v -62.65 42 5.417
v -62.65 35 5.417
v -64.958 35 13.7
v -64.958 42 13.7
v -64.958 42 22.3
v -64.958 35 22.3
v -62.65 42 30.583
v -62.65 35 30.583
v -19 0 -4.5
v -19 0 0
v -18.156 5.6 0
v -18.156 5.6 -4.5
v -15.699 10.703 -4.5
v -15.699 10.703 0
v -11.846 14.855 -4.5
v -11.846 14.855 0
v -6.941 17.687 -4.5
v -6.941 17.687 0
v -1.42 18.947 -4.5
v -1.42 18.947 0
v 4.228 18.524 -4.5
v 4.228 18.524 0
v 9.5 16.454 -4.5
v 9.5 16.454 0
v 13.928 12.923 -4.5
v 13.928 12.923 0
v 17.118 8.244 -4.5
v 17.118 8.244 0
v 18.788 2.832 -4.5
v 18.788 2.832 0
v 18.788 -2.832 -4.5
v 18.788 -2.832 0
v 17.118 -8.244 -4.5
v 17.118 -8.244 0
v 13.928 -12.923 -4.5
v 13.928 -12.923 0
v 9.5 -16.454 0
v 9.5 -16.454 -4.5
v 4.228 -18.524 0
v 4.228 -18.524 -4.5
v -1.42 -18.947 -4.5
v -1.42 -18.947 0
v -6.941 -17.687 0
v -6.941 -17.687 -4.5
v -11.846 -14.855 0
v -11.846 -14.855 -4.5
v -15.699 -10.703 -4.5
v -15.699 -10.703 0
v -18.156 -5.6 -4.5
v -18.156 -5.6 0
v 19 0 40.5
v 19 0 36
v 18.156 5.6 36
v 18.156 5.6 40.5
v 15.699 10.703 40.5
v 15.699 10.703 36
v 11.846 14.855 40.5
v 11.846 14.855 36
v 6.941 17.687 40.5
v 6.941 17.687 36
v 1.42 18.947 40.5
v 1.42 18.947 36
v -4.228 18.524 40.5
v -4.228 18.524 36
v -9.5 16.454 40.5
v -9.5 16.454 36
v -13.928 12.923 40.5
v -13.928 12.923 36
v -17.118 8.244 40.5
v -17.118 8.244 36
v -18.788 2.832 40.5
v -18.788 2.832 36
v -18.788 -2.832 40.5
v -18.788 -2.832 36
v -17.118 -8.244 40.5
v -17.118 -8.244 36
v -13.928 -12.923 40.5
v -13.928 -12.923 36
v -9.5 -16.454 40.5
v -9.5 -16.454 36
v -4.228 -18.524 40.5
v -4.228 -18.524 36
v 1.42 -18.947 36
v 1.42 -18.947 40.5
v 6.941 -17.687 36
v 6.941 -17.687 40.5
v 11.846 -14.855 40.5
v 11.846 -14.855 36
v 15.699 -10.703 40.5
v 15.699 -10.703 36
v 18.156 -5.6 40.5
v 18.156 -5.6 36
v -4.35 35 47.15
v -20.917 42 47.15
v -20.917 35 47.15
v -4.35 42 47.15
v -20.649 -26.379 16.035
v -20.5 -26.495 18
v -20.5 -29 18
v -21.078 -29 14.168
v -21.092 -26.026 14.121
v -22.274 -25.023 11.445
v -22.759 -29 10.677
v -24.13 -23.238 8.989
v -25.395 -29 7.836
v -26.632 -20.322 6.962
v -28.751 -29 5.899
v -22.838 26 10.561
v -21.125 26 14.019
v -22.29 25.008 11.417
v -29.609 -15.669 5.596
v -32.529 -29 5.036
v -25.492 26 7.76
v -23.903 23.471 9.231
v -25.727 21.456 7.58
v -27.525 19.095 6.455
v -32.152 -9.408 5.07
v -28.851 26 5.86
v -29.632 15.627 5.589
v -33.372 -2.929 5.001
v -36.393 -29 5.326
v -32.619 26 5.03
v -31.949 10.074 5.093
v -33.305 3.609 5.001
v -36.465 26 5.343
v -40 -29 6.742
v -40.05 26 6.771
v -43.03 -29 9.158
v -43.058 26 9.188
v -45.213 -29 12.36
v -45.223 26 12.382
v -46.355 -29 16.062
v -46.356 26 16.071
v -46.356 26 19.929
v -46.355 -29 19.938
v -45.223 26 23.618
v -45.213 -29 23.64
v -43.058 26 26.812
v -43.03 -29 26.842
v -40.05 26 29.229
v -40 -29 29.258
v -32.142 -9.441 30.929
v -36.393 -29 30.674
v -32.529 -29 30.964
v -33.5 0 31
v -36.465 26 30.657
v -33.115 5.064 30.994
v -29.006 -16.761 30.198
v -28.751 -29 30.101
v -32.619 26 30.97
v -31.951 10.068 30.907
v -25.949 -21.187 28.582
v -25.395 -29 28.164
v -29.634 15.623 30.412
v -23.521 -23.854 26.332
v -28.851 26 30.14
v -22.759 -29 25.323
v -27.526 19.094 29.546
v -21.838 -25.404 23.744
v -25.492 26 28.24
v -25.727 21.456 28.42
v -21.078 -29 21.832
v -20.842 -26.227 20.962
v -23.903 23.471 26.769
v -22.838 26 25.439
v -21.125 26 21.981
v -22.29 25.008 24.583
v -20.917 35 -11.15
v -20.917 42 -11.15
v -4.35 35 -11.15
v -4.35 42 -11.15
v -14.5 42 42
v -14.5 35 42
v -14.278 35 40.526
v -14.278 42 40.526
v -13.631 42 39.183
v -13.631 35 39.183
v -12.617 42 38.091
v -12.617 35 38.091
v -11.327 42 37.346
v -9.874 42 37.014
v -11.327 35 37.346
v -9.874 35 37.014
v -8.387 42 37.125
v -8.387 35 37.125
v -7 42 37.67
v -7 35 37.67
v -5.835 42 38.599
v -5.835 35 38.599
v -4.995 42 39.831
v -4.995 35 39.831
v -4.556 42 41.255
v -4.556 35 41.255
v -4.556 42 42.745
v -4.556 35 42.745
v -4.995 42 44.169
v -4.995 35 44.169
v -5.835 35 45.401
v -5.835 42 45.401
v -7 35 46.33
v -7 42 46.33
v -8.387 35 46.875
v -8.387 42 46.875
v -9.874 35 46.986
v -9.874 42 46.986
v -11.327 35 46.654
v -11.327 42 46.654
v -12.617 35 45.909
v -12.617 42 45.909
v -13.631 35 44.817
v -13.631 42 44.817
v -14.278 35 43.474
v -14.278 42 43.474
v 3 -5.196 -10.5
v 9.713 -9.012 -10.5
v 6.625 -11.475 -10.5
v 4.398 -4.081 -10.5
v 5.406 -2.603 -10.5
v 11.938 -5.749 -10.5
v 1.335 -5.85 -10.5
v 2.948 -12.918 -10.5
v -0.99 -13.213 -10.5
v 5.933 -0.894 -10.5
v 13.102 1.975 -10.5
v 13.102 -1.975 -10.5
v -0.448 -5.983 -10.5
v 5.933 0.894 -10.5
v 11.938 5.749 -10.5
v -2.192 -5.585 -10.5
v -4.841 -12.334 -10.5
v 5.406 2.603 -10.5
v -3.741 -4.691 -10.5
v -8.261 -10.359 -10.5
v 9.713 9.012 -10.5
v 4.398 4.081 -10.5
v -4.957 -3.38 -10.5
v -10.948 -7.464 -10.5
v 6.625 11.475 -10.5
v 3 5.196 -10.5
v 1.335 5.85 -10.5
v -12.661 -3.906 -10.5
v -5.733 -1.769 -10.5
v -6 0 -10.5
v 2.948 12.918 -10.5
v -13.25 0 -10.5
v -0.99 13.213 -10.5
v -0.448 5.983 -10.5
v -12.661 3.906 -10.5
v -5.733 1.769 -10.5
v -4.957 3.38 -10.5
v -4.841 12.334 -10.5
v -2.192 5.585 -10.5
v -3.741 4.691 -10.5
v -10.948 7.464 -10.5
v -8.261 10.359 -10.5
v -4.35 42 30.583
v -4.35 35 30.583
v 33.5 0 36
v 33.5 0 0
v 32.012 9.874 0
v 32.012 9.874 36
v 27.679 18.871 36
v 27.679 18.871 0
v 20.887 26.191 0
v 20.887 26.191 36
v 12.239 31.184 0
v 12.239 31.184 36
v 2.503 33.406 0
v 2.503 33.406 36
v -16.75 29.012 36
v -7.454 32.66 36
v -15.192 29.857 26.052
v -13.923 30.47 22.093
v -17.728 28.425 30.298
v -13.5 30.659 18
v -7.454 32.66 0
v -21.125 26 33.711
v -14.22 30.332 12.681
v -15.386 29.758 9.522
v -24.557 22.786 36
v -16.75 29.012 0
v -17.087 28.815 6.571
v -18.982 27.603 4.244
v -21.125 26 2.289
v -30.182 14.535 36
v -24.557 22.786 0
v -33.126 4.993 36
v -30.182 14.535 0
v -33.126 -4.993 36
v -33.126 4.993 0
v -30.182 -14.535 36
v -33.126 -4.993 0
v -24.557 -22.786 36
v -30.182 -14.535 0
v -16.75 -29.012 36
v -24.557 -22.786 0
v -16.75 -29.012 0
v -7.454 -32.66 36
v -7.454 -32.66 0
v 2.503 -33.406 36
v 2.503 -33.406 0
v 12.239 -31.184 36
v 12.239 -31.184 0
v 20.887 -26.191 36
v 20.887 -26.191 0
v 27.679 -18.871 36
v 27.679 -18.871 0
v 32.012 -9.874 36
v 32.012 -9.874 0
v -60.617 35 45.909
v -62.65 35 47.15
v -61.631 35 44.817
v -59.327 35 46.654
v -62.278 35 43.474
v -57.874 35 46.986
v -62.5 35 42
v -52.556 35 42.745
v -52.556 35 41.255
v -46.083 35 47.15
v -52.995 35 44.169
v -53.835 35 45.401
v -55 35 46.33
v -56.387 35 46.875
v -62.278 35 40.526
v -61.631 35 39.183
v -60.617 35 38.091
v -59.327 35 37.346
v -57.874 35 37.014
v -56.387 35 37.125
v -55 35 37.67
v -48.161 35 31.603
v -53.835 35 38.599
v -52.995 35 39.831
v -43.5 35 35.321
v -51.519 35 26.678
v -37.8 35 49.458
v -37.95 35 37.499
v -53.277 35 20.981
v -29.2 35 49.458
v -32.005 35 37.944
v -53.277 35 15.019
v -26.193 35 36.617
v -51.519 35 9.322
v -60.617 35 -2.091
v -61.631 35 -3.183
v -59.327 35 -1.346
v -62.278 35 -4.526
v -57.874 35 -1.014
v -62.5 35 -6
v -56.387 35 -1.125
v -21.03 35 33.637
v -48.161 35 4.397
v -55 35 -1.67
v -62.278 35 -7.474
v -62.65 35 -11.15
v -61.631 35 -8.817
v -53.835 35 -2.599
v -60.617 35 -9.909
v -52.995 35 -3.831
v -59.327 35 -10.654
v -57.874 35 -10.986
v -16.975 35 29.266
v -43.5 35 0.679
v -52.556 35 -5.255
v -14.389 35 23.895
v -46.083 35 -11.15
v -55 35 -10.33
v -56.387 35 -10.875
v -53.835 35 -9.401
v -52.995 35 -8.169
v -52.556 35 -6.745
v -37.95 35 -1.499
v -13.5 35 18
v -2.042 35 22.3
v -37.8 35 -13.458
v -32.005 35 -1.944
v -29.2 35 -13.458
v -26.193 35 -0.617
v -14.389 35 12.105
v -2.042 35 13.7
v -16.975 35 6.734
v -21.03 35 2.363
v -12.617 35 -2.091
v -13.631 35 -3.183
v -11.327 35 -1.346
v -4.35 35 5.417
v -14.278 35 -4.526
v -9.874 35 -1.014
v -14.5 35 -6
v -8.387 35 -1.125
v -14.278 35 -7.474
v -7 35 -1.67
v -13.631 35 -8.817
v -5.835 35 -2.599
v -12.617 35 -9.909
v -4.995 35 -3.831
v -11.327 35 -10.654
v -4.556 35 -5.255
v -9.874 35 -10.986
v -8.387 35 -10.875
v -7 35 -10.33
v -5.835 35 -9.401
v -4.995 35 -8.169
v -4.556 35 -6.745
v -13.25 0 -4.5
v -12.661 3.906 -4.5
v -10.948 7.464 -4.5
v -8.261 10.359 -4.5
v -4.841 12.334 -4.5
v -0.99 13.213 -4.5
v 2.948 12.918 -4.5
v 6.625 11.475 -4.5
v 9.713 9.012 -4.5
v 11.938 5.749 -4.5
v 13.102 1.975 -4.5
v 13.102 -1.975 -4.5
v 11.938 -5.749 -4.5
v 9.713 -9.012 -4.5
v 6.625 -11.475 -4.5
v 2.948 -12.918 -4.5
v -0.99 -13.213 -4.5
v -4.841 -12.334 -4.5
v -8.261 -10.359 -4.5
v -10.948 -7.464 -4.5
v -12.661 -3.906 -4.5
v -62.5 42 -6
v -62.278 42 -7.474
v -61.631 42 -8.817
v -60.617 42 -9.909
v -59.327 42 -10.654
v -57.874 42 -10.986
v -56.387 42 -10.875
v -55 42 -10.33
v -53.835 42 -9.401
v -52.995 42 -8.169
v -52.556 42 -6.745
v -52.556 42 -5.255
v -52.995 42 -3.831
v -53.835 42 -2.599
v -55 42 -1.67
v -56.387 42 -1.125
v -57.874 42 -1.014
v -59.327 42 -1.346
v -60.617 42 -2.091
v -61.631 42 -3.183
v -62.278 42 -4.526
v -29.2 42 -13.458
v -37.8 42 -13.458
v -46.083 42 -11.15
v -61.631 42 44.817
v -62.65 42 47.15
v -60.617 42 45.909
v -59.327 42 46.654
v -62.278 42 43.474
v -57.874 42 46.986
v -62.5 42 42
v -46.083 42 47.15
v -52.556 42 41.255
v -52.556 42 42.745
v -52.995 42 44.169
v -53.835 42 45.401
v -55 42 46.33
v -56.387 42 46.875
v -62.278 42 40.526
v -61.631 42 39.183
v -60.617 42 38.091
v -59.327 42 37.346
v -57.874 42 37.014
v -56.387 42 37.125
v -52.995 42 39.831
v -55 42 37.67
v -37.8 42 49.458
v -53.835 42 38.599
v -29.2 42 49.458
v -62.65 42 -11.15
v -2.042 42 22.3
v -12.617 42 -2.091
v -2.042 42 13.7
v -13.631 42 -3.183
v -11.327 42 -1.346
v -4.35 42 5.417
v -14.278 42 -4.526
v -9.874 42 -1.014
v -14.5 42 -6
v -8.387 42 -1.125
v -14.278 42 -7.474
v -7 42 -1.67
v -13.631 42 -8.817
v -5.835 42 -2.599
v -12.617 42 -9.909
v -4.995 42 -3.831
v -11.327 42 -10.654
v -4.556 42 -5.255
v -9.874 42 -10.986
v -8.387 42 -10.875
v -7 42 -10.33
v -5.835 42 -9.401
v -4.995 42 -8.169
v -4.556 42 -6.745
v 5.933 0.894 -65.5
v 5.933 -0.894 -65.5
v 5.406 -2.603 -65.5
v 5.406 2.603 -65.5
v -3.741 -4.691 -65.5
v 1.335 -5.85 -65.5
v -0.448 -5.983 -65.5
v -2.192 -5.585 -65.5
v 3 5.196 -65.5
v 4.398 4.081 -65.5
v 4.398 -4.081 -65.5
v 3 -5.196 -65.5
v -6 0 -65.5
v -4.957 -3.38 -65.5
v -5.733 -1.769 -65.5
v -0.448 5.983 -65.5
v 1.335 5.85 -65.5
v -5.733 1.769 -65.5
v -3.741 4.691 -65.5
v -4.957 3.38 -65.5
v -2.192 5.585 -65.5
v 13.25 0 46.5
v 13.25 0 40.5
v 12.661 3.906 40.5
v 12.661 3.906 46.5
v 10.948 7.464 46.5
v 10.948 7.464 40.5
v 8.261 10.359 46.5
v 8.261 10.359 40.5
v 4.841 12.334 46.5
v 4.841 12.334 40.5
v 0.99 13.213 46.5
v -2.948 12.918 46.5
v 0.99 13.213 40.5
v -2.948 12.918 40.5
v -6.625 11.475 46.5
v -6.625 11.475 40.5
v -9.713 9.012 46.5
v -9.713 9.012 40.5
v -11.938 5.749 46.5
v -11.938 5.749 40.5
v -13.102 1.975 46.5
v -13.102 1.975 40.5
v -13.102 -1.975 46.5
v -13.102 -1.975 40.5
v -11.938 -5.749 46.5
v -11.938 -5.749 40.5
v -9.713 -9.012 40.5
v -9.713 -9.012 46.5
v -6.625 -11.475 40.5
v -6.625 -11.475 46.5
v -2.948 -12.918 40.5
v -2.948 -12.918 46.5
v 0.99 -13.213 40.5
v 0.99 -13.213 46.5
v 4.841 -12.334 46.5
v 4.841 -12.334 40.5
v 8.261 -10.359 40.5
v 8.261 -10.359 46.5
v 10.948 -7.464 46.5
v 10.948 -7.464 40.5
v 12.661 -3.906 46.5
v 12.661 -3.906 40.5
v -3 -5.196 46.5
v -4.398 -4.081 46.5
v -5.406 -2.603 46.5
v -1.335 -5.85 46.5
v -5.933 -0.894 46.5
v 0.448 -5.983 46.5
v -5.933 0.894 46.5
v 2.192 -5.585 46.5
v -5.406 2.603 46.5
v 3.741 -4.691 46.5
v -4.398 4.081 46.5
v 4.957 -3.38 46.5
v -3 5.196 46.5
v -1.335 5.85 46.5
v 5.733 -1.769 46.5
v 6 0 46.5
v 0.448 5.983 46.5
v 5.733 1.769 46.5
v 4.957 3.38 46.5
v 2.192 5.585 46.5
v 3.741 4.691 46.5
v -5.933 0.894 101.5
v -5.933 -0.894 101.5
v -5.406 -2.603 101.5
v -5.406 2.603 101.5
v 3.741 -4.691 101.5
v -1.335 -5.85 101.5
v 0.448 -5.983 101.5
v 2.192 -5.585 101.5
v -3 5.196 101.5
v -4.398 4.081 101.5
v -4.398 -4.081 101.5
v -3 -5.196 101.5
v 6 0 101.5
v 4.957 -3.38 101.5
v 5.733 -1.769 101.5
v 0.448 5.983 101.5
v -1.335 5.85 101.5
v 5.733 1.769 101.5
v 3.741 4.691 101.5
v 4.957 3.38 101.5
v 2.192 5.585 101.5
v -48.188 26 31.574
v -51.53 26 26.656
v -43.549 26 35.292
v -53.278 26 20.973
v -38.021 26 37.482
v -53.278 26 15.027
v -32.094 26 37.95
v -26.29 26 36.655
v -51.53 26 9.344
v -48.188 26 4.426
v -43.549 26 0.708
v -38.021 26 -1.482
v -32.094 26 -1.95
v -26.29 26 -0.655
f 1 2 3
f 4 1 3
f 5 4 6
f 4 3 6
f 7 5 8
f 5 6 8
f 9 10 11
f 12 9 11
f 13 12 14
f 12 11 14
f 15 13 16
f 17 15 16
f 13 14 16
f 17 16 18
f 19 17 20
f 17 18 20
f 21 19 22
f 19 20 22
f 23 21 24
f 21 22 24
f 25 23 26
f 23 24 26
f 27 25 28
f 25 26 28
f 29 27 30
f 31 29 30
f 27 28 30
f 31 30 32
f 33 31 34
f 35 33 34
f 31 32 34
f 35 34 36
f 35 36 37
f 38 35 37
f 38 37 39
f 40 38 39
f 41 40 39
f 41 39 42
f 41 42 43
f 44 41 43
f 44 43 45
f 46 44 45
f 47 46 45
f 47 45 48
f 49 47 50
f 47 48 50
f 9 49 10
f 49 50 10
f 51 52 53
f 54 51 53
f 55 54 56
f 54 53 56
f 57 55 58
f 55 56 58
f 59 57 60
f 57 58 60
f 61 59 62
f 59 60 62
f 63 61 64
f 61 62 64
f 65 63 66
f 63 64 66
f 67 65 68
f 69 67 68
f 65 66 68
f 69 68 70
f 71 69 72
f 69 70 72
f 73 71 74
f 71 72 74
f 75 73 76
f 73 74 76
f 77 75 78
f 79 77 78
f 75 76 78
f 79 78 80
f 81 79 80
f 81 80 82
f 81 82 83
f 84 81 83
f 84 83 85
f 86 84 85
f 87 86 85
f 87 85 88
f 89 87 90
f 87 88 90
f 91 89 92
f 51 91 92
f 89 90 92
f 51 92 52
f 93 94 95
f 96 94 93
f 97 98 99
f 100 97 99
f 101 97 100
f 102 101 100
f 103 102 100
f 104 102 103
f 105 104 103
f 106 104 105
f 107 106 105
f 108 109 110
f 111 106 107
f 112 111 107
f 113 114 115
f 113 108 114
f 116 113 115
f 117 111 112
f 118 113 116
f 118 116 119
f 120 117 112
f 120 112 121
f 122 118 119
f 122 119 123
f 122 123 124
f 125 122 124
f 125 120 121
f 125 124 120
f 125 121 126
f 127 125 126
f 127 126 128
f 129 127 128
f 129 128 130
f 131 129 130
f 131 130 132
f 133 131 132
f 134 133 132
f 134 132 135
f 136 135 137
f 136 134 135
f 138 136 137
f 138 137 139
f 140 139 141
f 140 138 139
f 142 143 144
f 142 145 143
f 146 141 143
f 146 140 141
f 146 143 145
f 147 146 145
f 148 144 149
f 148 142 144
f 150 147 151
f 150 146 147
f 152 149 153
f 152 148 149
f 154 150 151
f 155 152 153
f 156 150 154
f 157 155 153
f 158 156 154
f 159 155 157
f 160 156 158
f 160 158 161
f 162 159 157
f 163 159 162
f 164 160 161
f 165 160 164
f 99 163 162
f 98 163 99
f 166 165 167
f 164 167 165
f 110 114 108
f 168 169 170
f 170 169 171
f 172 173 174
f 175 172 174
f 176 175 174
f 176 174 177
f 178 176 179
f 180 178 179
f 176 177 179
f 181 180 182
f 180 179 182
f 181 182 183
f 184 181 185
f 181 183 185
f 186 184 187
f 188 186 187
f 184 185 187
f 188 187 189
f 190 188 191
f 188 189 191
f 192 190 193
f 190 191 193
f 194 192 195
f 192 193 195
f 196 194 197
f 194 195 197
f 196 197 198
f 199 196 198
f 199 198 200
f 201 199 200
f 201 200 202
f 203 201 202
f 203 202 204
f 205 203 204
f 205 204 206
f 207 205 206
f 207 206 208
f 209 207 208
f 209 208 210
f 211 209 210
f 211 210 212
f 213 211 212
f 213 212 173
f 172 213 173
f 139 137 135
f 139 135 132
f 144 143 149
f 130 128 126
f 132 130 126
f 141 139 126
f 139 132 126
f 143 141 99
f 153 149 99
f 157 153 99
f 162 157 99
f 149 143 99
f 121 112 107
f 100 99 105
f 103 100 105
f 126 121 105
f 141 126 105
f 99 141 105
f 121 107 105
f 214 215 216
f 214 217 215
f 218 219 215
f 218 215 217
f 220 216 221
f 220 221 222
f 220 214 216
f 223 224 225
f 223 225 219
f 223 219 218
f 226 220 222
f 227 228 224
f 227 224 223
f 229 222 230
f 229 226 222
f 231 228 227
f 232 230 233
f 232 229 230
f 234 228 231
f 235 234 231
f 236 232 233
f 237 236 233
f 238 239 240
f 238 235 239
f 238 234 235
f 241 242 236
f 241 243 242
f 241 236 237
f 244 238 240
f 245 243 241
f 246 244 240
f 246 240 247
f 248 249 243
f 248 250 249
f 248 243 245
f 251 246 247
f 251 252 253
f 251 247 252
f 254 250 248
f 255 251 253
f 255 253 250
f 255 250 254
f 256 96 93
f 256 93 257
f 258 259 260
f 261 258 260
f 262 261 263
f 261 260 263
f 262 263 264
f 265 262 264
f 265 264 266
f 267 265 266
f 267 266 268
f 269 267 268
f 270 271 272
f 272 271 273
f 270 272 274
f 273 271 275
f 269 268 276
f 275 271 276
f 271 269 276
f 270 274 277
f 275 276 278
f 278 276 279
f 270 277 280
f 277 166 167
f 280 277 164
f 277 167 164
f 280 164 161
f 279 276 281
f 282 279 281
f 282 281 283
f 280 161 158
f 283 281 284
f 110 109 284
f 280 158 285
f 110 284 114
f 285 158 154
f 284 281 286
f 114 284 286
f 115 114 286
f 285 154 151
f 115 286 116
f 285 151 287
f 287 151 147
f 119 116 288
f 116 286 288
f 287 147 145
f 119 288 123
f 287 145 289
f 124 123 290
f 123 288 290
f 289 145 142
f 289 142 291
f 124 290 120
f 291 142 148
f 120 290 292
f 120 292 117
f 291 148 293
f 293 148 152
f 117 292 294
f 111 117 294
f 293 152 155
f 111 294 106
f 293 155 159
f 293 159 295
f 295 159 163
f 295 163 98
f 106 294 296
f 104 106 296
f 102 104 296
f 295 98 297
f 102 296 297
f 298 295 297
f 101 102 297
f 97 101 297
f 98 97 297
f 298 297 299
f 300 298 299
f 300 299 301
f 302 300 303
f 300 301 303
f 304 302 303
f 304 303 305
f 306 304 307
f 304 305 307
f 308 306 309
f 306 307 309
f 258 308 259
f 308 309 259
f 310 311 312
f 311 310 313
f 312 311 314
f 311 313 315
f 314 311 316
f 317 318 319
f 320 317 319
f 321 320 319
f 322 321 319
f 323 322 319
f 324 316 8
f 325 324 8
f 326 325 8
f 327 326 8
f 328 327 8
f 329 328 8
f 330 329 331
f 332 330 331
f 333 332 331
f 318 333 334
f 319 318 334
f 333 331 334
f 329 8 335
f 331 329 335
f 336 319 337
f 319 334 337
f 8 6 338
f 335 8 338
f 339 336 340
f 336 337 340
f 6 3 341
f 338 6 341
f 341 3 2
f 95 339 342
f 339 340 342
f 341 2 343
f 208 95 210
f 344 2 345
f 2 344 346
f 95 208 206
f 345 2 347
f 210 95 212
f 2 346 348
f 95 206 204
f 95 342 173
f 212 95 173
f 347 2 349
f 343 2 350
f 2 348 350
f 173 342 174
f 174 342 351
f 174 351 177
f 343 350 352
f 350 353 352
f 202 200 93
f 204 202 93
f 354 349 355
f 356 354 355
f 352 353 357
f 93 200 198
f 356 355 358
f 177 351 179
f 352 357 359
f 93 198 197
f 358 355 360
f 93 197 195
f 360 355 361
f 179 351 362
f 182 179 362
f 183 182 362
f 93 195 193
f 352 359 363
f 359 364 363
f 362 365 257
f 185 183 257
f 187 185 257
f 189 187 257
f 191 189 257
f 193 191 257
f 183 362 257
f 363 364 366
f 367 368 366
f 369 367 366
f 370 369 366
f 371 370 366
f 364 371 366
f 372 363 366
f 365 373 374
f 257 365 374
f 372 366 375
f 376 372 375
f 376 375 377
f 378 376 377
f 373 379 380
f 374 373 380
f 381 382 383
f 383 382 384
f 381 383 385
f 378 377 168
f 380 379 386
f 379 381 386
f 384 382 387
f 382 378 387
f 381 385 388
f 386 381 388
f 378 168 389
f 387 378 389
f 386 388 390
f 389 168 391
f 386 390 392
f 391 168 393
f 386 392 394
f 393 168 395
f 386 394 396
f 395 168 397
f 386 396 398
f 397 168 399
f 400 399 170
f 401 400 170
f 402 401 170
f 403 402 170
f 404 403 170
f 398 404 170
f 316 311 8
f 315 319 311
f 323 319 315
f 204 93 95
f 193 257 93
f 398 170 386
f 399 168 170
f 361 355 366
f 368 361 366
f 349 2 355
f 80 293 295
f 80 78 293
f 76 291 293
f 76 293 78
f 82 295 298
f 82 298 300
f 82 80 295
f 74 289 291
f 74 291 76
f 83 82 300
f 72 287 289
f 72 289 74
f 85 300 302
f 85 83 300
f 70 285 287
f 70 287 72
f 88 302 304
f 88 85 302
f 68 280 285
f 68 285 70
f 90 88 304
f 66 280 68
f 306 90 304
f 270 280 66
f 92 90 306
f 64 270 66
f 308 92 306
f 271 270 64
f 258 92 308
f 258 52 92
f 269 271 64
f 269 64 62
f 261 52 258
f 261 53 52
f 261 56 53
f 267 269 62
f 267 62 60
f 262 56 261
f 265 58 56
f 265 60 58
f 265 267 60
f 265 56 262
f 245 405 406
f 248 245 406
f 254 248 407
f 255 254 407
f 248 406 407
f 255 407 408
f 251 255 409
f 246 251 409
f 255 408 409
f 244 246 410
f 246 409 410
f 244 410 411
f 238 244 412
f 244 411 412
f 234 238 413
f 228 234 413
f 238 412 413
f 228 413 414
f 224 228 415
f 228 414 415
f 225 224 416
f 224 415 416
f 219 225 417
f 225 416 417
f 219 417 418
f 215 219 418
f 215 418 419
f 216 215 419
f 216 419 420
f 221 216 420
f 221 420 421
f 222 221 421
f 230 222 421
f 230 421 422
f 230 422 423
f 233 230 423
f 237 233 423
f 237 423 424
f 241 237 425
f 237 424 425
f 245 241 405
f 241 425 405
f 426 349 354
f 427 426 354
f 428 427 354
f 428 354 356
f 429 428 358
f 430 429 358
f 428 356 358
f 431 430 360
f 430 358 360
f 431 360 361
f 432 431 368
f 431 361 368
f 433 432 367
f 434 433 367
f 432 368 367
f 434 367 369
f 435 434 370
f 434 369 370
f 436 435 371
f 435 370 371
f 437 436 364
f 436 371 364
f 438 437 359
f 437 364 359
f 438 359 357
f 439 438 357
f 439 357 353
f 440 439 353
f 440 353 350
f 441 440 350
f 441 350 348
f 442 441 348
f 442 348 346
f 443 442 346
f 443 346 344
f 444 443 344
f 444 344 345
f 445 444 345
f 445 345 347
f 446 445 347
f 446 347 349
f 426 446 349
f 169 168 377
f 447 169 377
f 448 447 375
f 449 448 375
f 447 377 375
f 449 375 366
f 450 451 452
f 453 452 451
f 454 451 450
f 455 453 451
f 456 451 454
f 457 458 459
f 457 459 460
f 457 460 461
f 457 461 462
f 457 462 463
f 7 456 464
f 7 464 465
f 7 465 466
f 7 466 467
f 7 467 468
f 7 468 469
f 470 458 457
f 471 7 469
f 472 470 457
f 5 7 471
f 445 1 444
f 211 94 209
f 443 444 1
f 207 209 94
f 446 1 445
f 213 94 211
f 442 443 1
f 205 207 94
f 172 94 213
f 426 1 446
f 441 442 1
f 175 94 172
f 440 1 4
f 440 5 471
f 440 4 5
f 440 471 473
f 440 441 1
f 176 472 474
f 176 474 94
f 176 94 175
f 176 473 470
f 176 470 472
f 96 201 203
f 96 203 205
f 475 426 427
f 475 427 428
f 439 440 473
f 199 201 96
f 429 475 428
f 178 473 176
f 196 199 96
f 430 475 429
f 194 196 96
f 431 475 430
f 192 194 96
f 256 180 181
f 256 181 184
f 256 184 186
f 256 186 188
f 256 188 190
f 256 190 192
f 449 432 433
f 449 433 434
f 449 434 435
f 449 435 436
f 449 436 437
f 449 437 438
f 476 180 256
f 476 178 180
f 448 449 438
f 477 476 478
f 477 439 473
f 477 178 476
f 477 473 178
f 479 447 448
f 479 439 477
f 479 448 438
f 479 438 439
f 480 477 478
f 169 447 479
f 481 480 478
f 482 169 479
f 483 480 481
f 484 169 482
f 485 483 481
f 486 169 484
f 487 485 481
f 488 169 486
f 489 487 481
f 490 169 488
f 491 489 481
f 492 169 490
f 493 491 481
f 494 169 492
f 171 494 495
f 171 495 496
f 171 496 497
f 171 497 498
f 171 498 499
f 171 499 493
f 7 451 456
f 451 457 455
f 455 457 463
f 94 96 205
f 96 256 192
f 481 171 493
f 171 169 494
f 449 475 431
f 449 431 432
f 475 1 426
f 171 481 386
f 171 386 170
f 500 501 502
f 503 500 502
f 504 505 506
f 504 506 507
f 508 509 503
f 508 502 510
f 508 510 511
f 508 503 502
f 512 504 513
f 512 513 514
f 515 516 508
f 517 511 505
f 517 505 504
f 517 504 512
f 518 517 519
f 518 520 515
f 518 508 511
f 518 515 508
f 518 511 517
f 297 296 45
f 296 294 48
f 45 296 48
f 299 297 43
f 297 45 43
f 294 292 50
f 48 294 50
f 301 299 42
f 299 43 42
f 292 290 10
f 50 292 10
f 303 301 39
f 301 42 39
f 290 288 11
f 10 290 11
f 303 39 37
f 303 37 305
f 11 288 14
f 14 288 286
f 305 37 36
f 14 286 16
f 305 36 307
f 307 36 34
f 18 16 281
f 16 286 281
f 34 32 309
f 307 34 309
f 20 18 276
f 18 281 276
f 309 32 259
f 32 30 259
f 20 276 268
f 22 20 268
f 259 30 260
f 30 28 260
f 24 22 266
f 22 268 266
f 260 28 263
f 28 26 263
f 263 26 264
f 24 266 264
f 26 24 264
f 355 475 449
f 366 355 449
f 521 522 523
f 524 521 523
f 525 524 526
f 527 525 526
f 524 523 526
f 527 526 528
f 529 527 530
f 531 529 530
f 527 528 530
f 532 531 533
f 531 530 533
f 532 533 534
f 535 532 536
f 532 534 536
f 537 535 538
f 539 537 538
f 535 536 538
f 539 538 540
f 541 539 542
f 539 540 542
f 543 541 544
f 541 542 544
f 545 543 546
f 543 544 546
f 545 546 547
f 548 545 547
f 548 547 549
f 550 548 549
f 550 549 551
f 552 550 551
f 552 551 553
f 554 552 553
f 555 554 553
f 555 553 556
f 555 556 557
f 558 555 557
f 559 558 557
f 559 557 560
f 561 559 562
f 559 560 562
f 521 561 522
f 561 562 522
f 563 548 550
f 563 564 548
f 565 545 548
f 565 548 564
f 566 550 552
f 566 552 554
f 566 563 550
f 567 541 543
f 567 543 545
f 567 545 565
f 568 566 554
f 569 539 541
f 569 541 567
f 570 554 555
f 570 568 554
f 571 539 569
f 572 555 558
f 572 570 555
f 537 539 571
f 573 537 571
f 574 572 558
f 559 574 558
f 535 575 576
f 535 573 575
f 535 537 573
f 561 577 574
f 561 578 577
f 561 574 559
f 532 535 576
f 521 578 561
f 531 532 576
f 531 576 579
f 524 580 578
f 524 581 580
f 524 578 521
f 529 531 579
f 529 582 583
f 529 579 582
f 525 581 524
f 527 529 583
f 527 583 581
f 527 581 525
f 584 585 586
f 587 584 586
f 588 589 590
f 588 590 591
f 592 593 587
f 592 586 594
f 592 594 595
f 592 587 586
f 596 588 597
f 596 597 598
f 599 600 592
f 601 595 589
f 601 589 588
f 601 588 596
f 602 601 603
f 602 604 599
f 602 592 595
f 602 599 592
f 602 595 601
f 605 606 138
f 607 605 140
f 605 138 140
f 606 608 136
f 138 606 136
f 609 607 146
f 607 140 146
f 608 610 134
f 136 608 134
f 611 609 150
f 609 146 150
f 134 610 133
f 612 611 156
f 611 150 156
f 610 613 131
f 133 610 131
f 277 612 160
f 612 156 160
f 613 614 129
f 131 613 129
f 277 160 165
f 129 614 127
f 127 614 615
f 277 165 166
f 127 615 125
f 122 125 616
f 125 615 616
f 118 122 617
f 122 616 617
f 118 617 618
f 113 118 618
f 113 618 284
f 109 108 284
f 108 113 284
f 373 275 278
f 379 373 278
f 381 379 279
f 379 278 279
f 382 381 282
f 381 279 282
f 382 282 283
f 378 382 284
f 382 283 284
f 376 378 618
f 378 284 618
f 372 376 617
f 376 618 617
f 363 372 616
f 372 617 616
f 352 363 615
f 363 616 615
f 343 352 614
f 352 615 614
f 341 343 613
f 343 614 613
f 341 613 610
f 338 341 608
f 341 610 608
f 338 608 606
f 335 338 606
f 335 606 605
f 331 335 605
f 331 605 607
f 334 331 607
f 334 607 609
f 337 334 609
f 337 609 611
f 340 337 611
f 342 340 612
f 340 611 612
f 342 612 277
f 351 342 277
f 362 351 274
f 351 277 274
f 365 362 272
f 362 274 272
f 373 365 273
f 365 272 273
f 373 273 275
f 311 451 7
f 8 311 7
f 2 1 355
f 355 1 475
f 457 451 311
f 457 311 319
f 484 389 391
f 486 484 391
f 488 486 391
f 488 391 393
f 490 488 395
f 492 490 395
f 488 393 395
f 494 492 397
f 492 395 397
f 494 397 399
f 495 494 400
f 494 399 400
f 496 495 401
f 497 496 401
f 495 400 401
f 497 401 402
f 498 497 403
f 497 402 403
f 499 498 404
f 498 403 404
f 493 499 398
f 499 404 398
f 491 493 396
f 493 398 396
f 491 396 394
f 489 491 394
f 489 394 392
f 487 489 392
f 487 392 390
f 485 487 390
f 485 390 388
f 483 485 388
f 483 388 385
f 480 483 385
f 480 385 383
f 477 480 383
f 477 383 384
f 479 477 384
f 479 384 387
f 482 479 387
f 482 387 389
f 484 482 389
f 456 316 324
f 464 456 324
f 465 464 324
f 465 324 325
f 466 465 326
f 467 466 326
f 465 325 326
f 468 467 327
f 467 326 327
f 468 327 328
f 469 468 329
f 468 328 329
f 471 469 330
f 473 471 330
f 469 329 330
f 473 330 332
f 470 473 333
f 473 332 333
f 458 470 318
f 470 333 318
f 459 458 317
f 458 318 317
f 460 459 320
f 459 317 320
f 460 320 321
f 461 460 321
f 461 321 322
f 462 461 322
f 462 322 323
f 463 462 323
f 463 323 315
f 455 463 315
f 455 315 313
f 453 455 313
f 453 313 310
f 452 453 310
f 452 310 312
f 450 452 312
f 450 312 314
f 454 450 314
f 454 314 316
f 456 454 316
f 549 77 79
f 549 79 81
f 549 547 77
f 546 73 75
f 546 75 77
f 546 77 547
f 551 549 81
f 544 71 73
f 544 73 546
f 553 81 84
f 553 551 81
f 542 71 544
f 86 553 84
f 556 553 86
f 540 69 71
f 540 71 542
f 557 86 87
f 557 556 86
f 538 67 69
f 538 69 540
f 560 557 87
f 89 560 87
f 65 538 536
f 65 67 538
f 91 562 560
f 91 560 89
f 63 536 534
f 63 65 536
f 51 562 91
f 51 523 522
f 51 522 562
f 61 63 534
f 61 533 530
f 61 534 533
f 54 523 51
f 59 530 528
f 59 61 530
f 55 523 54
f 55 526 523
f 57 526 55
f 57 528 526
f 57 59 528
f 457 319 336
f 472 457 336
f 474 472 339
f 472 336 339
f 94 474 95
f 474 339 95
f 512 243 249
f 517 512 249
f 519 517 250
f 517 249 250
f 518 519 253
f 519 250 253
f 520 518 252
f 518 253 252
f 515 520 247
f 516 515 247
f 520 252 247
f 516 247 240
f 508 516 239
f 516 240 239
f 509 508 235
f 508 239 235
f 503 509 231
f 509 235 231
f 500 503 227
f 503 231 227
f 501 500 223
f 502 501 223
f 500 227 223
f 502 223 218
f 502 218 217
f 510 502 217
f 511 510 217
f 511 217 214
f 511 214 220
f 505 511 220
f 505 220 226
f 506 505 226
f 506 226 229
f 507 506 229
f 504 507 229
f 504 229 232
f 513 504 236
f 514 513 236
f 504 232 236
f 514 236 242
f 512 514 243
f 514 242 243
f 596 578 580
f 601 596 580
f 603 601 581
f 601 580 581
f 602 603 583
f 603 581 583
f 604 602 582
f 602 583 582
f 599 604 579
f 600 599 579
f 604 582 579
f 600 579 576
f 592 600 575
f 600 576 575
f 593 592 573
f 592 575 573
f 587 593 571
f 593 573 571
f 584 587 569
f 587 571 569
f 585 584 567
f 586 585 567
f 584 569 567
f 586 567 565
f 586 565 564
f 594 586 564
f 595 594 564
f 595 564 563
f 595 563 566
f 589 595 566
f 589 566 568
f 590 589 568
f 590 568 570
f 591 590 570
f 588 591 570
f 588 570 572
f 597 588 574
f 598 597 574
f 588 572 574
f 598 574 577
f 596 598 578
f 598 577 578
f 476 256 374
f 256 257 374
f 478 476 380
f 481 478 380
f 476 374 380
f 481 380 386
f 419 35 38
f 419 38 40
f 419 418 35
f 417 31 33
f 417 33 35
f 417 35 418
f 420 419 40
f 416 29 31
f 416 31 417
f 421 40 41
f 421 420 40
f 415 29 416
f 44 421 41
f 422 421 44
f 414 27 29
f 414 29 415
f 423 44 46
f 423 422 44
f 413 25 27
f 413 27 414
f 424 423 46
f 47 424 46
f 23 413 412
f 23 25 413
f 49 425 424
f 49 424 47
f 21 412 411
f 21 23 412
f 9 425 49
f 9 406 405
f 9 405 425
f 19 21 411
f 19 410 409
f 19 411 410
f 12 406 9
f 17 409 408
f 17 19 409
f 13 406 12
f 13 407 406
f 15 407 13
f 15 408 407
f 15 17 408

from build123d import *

# Parameters (mm, degrees)
SKIZZE1_R                            = 33.5
AUFSATZ_LINEAR_AUSTRAGEN1_DEPTH      = 36
SKIZZE2_R                            = 19
AUFSATZ_LINEAR_AUSTRAGEN2_DEPTH      = 4.5
SKIZZE3_R                            = 13.25
AUFSATZ_LINEAR_AUSTRAGEN3_DEPTH      = 6
SKIZZE4_R                            = 13
AUFSATZ_LINEAR_AUSTRAGEN4_DEPTH      = 26
AUFSATZ_LINEAR_AUSTRAGEN4_DEPTH_BACK = 29
SKIZZE5_R                            = 20
AUFSATZ_LINEAR_AUSTRAGEN5_DEPTH      = 9
SKIZZE6_R                            = 31.75
AUFSATZ_LINEAR_AUSTRAGEN6_DEPTH      = 7
SKIZZE7_W                            = 58.3
SKIZZE7_H                            = 58.3
AUFSATZ_LINEAR_AUSTRAGEN7_DEPTH      = 7
F_10_0_10_DURCHMESSER_BOHRUNG1_D     = 10
F_10_0_10_DURCHMESSER_BOHRUNG1_DEPTH = 7
SKIZZE13_R                           = 19
AUFSATZ_LINEAR_AUSTRAGEN8_DEPTH      = 4.5
SKIZZE14_R                           = 13.25
AUFSATZ_LINEAR_AUSTRAGEN9_DEPTH      = 6
SKIZZE15_R                           = 6
AUFSATZ_LINEAR_AUSTRAGEN10_DEPTH     = 55
SKIZZE16_R                           = 6
AUFSATZ_LINEAR_AUSTRAGEN11_DEPTH     = 55


with BuildPart() as part:
    # Skizze1 → Aufsatz-Linear austragen1 (new body)
    with BuildSketch(Plane.XY):
        Circle(SKIZZE1_R)
    extrude(amount=AUFSATZ_LINEAR_AUSTRAGEN1_DEPTH)

    # Skizze2 → Aufsatz-Linear austragen2 (add)
    with BuildSketch(Plane.XY.offset(36)):
        Circle(SKIZZE2_R)
    extrude(amount=AUFSATZ_LINEAR_AUSTRAGEN2_DEPTH)

    # Skizze3 → Aufsatz-Linear austragen3 (add)
    with BuildSketch(Plane.XY.offset(40.5)):
        Circle(SKIZZE3_R)
    extrude(amount=AUFSATZ_LINEAR_AUSTRAGEN3_DEPTH)

    # Skizze4 → Aufsatz-Linear austragen4 (add, two sides)
    with BuildSketch(Plane(origin=(0, 0, 0), x_dir=(1, 0, 0), z_dir=(0, 1, 0))) as aufsatz_linear_austragen4_sk:
        with Locations((-33.5, -18)):
            Circle(SKIZZE4_R)
    extrude(amount=AUFSATZ_LINEAR_AUSTRAGEN4_DEPTH)
    extrude(aufsatz_linear_austragen4_sk.sketch, amount=-AUFSATZ_LINEAR_AUSTRAGEN4_DEPTH_BACK)

    # Skizze5 → Aufsatz-Linear austragen5 (add)
    with BuildSketch(Plane(origin=(0, 26, 0), x_dir=(1, 0, 0), z_dir=(0, 1, 0))):
        with Locations((-33.5, -18)):
            Circle(SKIZZE5_R)
    extrude(amount=AUFSATZ_LINEAR_AUSTRAGEN5_DEPTH)

    # Skizze6 → Aufsatz-Linear austragen6 (add)
    with BuildSketch(Plane(origin=(0, 35, 0), x_dir=(1, 0, 0), z_dir=(0, 1, 0))):
        with Locations((-33.5, -18)):
            Circle(SKIZZE6_R)
    extrude(amount=AUFSATZ_LINEAR_AUSTRAGEN6_DEPTH)

    # Skizze7 → Aufsatz-Linear austragen7 (add)
    with BuildSketch(Plane(origin=(0, 42, 0), x_dir=(1, 0, 0), z_dir=(0, 1, 0))):
        with Locations((-33.5, -18)):
            Rectangle(SKIZZE7_W, SKIZZE7_H)
    extrude(amount=-AUFSATZ_LINEAR_AUSTRAGEN7_DEPTH)

    # Ø10.0 (10) Durchmesser Bohrung1
    with Locations(Plane(origin=(0, 42, 0), x_dir=(1, 0, 0), z_dir=(0, 1, 0))):
        with Locations((-57.5, -42), (-57.5, 6), (-9.5, 6), (-9.5, -42)):
            Hole(F_10_0_10_DURCHMESSER_BOHRUNG1_D / 2, depth=F_10_0_10_DURCHMESSER_BOHRUNG1_DEPTH)

    # Skizze13 → Aufsatz-Linear austragen8 (add)
    with BuildSketch(Plane(origin=(0, 0, 0), x_dir=(-1, 0, 0), z_dir=(0, 0, -1))):
        Circle(SKIZZE13_R)
    extrude(amount=AUFSATZ_LINEAR_AUSTRAGEN8_DEPTH)

    # Skizze14 → Aufsatz-Linear austragen9 (add)
    with BuildSketch(Plane(origin=(0, 0, -4.5), x_dir=(-1, 0, 0), z_dir=(0, 0, -1))):
        Circle(SKIZZE14_R)
    extrude(amount=AUFSATZ_LINEAR_AUSTRAGEN9_DEPTH)

    # Skizze15 → Aufsatz-Linear austragen10 (add)
    with BuildSketch(Plane(origin=(0, 0, -10.5), x_dir=(-1, 0, 0), z_dir=(0, 0, -1))):
        Circle(SKIZZE15_R)
    extrude(amount=AUFSATZ_LINEAR_AUSTRAGEN10_DEPTH)

    # Skizze16 → Aufsatz-Linear austragen11 (add)
    with BuildSketch(Plane.XY.offset(46.5)):
        Circle(SKIZZE16_R)
    extrude(amount=AUFSATZ_LINEAR_AUSTRAGEN11_DEPTH)


solid = part.part
